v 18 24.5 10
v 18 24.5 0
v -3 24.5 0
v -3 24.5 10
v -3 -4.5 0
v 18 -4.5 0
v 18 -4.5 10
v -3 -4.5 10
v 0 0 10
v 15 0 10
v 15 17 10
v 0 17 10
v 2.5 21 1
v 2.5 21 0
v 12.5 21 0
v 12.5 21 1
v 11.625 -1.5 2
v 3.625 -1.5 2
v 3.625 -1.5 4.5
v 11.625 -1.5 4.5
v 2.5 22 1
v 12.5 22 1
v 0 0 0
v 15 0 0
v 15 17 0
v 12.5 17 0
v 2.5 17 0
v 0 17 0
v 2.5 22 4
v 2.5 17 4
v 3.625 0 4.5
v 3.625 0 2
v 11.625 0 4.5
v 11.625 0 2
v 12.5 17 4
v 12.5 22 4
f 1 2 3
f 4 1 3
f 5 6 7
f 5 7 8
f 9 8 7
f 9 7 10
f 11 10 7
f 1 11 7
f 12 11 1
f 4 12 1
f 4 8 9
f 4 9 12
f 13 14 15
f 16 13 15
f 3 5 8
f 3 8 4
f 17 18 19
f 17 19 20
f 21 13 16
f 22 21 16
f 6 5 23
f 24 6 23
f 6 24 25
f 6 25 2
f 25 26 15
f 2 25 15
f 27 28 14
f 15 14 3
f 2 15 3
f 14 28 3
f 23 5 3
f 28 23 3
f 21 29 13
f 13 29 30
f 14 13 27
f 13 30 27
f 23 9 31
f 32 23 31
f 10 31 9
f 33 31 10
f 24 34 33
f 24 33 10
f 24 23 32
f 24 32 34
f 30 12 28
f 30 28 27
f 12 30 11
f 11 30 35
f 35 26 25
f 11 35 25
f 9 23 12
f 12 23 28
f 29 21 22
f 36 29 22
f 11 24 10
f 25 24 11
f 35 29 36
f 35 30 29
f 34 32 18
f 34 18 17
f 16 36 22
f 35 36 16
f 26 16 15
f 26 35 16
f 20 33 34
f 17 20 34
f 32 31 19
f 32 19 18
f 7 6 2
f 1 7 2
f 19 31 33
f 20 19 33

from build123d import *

# Parameters (mm, degrees)
FACE003_W        = 10
FACE003_H        = 3
EXTRUDE003_DEPTH = 1
FACE002_W        = 10
FACE002_H        = 4
EXTRUDE002_DEPTH = 4
FACE001_W        = 8
FACE001_H        = 2.5
EXTRUDE001_DEPTH = 1.5
SKETCH_W         = 15
SKETCH_H         = 17
EXTRUDE_DEPTH    = 10
FACE004_W        = 29
FACE004_H        = 21
EXTRUDE004_DEPTH = 10


with BuildPart() as extrude003:
    # Face003 → Extrude003 (new body)
    with BuildSketch(Plane(origin=(7.5, 21, 2.5), x_dir=(1, 0, 0), z_dir=(0, 1, 0))):
        Rectangle(FACE003_W, FACE003_H)
    extrude(amount=EXTRUDE003_DEPTH)


with BuildPart() as fusion001:
    # Face002 → Extrude002 (new body)
    with BuildSketch(Plane(origin=(7.5, 17, 2), x_dir=(1, 0, 0), z_dir=(0, 1, 0))):
        Rectangle(FACE002_W, FACE002_H)
    extrude(amount=EXTRUDE002_DEPTH)

    # Fusion001: union Extrude003
    add(extrude003.part)


with BuildPart() as extrude001:
    # Face001 → Extrude001 (new body)
    with BuildSketch(Plane(origin=(7.624542, 0, 3.25), x_dir=(1, 0, 0), z_dir=(0, 1, 0))):
        Rectangle(FACE001_W, FACE001_H)
    extrude(amount=-EXTRUDE001_DEPTH)


with BuildPart() as fusion002:
    # Sketch → Extrude (new body)
    with BuildSketch(Plane.XY):
        with Locations((7.5, 8.5)):
            Rectangle(SKETCH_W, SKETCH_H)
    extrude(amount=EXTRUDE_DEPTH)

    # Fusion: union Extrude001
    add(extrude001.part)

    # Fusion002: union Fusion001
    add(fusion001.part)


with BuildPart() as cut:
    # Face004 → Extrude004 (new body)
    with BuildSketch(Plane(origin=(7.5, 10, 0), x_dir=(0, 1, 0), z_dir=(0, 0, 1))):
        Rectangle(FACE004_W, FACE004_H)
    extrude(amount=EXTRUDE004_DEPTH)

    # Cut: cut Fusion002
    add(fusion002.part, mode=Mode.SUBTRACT)


solid = cut.part
